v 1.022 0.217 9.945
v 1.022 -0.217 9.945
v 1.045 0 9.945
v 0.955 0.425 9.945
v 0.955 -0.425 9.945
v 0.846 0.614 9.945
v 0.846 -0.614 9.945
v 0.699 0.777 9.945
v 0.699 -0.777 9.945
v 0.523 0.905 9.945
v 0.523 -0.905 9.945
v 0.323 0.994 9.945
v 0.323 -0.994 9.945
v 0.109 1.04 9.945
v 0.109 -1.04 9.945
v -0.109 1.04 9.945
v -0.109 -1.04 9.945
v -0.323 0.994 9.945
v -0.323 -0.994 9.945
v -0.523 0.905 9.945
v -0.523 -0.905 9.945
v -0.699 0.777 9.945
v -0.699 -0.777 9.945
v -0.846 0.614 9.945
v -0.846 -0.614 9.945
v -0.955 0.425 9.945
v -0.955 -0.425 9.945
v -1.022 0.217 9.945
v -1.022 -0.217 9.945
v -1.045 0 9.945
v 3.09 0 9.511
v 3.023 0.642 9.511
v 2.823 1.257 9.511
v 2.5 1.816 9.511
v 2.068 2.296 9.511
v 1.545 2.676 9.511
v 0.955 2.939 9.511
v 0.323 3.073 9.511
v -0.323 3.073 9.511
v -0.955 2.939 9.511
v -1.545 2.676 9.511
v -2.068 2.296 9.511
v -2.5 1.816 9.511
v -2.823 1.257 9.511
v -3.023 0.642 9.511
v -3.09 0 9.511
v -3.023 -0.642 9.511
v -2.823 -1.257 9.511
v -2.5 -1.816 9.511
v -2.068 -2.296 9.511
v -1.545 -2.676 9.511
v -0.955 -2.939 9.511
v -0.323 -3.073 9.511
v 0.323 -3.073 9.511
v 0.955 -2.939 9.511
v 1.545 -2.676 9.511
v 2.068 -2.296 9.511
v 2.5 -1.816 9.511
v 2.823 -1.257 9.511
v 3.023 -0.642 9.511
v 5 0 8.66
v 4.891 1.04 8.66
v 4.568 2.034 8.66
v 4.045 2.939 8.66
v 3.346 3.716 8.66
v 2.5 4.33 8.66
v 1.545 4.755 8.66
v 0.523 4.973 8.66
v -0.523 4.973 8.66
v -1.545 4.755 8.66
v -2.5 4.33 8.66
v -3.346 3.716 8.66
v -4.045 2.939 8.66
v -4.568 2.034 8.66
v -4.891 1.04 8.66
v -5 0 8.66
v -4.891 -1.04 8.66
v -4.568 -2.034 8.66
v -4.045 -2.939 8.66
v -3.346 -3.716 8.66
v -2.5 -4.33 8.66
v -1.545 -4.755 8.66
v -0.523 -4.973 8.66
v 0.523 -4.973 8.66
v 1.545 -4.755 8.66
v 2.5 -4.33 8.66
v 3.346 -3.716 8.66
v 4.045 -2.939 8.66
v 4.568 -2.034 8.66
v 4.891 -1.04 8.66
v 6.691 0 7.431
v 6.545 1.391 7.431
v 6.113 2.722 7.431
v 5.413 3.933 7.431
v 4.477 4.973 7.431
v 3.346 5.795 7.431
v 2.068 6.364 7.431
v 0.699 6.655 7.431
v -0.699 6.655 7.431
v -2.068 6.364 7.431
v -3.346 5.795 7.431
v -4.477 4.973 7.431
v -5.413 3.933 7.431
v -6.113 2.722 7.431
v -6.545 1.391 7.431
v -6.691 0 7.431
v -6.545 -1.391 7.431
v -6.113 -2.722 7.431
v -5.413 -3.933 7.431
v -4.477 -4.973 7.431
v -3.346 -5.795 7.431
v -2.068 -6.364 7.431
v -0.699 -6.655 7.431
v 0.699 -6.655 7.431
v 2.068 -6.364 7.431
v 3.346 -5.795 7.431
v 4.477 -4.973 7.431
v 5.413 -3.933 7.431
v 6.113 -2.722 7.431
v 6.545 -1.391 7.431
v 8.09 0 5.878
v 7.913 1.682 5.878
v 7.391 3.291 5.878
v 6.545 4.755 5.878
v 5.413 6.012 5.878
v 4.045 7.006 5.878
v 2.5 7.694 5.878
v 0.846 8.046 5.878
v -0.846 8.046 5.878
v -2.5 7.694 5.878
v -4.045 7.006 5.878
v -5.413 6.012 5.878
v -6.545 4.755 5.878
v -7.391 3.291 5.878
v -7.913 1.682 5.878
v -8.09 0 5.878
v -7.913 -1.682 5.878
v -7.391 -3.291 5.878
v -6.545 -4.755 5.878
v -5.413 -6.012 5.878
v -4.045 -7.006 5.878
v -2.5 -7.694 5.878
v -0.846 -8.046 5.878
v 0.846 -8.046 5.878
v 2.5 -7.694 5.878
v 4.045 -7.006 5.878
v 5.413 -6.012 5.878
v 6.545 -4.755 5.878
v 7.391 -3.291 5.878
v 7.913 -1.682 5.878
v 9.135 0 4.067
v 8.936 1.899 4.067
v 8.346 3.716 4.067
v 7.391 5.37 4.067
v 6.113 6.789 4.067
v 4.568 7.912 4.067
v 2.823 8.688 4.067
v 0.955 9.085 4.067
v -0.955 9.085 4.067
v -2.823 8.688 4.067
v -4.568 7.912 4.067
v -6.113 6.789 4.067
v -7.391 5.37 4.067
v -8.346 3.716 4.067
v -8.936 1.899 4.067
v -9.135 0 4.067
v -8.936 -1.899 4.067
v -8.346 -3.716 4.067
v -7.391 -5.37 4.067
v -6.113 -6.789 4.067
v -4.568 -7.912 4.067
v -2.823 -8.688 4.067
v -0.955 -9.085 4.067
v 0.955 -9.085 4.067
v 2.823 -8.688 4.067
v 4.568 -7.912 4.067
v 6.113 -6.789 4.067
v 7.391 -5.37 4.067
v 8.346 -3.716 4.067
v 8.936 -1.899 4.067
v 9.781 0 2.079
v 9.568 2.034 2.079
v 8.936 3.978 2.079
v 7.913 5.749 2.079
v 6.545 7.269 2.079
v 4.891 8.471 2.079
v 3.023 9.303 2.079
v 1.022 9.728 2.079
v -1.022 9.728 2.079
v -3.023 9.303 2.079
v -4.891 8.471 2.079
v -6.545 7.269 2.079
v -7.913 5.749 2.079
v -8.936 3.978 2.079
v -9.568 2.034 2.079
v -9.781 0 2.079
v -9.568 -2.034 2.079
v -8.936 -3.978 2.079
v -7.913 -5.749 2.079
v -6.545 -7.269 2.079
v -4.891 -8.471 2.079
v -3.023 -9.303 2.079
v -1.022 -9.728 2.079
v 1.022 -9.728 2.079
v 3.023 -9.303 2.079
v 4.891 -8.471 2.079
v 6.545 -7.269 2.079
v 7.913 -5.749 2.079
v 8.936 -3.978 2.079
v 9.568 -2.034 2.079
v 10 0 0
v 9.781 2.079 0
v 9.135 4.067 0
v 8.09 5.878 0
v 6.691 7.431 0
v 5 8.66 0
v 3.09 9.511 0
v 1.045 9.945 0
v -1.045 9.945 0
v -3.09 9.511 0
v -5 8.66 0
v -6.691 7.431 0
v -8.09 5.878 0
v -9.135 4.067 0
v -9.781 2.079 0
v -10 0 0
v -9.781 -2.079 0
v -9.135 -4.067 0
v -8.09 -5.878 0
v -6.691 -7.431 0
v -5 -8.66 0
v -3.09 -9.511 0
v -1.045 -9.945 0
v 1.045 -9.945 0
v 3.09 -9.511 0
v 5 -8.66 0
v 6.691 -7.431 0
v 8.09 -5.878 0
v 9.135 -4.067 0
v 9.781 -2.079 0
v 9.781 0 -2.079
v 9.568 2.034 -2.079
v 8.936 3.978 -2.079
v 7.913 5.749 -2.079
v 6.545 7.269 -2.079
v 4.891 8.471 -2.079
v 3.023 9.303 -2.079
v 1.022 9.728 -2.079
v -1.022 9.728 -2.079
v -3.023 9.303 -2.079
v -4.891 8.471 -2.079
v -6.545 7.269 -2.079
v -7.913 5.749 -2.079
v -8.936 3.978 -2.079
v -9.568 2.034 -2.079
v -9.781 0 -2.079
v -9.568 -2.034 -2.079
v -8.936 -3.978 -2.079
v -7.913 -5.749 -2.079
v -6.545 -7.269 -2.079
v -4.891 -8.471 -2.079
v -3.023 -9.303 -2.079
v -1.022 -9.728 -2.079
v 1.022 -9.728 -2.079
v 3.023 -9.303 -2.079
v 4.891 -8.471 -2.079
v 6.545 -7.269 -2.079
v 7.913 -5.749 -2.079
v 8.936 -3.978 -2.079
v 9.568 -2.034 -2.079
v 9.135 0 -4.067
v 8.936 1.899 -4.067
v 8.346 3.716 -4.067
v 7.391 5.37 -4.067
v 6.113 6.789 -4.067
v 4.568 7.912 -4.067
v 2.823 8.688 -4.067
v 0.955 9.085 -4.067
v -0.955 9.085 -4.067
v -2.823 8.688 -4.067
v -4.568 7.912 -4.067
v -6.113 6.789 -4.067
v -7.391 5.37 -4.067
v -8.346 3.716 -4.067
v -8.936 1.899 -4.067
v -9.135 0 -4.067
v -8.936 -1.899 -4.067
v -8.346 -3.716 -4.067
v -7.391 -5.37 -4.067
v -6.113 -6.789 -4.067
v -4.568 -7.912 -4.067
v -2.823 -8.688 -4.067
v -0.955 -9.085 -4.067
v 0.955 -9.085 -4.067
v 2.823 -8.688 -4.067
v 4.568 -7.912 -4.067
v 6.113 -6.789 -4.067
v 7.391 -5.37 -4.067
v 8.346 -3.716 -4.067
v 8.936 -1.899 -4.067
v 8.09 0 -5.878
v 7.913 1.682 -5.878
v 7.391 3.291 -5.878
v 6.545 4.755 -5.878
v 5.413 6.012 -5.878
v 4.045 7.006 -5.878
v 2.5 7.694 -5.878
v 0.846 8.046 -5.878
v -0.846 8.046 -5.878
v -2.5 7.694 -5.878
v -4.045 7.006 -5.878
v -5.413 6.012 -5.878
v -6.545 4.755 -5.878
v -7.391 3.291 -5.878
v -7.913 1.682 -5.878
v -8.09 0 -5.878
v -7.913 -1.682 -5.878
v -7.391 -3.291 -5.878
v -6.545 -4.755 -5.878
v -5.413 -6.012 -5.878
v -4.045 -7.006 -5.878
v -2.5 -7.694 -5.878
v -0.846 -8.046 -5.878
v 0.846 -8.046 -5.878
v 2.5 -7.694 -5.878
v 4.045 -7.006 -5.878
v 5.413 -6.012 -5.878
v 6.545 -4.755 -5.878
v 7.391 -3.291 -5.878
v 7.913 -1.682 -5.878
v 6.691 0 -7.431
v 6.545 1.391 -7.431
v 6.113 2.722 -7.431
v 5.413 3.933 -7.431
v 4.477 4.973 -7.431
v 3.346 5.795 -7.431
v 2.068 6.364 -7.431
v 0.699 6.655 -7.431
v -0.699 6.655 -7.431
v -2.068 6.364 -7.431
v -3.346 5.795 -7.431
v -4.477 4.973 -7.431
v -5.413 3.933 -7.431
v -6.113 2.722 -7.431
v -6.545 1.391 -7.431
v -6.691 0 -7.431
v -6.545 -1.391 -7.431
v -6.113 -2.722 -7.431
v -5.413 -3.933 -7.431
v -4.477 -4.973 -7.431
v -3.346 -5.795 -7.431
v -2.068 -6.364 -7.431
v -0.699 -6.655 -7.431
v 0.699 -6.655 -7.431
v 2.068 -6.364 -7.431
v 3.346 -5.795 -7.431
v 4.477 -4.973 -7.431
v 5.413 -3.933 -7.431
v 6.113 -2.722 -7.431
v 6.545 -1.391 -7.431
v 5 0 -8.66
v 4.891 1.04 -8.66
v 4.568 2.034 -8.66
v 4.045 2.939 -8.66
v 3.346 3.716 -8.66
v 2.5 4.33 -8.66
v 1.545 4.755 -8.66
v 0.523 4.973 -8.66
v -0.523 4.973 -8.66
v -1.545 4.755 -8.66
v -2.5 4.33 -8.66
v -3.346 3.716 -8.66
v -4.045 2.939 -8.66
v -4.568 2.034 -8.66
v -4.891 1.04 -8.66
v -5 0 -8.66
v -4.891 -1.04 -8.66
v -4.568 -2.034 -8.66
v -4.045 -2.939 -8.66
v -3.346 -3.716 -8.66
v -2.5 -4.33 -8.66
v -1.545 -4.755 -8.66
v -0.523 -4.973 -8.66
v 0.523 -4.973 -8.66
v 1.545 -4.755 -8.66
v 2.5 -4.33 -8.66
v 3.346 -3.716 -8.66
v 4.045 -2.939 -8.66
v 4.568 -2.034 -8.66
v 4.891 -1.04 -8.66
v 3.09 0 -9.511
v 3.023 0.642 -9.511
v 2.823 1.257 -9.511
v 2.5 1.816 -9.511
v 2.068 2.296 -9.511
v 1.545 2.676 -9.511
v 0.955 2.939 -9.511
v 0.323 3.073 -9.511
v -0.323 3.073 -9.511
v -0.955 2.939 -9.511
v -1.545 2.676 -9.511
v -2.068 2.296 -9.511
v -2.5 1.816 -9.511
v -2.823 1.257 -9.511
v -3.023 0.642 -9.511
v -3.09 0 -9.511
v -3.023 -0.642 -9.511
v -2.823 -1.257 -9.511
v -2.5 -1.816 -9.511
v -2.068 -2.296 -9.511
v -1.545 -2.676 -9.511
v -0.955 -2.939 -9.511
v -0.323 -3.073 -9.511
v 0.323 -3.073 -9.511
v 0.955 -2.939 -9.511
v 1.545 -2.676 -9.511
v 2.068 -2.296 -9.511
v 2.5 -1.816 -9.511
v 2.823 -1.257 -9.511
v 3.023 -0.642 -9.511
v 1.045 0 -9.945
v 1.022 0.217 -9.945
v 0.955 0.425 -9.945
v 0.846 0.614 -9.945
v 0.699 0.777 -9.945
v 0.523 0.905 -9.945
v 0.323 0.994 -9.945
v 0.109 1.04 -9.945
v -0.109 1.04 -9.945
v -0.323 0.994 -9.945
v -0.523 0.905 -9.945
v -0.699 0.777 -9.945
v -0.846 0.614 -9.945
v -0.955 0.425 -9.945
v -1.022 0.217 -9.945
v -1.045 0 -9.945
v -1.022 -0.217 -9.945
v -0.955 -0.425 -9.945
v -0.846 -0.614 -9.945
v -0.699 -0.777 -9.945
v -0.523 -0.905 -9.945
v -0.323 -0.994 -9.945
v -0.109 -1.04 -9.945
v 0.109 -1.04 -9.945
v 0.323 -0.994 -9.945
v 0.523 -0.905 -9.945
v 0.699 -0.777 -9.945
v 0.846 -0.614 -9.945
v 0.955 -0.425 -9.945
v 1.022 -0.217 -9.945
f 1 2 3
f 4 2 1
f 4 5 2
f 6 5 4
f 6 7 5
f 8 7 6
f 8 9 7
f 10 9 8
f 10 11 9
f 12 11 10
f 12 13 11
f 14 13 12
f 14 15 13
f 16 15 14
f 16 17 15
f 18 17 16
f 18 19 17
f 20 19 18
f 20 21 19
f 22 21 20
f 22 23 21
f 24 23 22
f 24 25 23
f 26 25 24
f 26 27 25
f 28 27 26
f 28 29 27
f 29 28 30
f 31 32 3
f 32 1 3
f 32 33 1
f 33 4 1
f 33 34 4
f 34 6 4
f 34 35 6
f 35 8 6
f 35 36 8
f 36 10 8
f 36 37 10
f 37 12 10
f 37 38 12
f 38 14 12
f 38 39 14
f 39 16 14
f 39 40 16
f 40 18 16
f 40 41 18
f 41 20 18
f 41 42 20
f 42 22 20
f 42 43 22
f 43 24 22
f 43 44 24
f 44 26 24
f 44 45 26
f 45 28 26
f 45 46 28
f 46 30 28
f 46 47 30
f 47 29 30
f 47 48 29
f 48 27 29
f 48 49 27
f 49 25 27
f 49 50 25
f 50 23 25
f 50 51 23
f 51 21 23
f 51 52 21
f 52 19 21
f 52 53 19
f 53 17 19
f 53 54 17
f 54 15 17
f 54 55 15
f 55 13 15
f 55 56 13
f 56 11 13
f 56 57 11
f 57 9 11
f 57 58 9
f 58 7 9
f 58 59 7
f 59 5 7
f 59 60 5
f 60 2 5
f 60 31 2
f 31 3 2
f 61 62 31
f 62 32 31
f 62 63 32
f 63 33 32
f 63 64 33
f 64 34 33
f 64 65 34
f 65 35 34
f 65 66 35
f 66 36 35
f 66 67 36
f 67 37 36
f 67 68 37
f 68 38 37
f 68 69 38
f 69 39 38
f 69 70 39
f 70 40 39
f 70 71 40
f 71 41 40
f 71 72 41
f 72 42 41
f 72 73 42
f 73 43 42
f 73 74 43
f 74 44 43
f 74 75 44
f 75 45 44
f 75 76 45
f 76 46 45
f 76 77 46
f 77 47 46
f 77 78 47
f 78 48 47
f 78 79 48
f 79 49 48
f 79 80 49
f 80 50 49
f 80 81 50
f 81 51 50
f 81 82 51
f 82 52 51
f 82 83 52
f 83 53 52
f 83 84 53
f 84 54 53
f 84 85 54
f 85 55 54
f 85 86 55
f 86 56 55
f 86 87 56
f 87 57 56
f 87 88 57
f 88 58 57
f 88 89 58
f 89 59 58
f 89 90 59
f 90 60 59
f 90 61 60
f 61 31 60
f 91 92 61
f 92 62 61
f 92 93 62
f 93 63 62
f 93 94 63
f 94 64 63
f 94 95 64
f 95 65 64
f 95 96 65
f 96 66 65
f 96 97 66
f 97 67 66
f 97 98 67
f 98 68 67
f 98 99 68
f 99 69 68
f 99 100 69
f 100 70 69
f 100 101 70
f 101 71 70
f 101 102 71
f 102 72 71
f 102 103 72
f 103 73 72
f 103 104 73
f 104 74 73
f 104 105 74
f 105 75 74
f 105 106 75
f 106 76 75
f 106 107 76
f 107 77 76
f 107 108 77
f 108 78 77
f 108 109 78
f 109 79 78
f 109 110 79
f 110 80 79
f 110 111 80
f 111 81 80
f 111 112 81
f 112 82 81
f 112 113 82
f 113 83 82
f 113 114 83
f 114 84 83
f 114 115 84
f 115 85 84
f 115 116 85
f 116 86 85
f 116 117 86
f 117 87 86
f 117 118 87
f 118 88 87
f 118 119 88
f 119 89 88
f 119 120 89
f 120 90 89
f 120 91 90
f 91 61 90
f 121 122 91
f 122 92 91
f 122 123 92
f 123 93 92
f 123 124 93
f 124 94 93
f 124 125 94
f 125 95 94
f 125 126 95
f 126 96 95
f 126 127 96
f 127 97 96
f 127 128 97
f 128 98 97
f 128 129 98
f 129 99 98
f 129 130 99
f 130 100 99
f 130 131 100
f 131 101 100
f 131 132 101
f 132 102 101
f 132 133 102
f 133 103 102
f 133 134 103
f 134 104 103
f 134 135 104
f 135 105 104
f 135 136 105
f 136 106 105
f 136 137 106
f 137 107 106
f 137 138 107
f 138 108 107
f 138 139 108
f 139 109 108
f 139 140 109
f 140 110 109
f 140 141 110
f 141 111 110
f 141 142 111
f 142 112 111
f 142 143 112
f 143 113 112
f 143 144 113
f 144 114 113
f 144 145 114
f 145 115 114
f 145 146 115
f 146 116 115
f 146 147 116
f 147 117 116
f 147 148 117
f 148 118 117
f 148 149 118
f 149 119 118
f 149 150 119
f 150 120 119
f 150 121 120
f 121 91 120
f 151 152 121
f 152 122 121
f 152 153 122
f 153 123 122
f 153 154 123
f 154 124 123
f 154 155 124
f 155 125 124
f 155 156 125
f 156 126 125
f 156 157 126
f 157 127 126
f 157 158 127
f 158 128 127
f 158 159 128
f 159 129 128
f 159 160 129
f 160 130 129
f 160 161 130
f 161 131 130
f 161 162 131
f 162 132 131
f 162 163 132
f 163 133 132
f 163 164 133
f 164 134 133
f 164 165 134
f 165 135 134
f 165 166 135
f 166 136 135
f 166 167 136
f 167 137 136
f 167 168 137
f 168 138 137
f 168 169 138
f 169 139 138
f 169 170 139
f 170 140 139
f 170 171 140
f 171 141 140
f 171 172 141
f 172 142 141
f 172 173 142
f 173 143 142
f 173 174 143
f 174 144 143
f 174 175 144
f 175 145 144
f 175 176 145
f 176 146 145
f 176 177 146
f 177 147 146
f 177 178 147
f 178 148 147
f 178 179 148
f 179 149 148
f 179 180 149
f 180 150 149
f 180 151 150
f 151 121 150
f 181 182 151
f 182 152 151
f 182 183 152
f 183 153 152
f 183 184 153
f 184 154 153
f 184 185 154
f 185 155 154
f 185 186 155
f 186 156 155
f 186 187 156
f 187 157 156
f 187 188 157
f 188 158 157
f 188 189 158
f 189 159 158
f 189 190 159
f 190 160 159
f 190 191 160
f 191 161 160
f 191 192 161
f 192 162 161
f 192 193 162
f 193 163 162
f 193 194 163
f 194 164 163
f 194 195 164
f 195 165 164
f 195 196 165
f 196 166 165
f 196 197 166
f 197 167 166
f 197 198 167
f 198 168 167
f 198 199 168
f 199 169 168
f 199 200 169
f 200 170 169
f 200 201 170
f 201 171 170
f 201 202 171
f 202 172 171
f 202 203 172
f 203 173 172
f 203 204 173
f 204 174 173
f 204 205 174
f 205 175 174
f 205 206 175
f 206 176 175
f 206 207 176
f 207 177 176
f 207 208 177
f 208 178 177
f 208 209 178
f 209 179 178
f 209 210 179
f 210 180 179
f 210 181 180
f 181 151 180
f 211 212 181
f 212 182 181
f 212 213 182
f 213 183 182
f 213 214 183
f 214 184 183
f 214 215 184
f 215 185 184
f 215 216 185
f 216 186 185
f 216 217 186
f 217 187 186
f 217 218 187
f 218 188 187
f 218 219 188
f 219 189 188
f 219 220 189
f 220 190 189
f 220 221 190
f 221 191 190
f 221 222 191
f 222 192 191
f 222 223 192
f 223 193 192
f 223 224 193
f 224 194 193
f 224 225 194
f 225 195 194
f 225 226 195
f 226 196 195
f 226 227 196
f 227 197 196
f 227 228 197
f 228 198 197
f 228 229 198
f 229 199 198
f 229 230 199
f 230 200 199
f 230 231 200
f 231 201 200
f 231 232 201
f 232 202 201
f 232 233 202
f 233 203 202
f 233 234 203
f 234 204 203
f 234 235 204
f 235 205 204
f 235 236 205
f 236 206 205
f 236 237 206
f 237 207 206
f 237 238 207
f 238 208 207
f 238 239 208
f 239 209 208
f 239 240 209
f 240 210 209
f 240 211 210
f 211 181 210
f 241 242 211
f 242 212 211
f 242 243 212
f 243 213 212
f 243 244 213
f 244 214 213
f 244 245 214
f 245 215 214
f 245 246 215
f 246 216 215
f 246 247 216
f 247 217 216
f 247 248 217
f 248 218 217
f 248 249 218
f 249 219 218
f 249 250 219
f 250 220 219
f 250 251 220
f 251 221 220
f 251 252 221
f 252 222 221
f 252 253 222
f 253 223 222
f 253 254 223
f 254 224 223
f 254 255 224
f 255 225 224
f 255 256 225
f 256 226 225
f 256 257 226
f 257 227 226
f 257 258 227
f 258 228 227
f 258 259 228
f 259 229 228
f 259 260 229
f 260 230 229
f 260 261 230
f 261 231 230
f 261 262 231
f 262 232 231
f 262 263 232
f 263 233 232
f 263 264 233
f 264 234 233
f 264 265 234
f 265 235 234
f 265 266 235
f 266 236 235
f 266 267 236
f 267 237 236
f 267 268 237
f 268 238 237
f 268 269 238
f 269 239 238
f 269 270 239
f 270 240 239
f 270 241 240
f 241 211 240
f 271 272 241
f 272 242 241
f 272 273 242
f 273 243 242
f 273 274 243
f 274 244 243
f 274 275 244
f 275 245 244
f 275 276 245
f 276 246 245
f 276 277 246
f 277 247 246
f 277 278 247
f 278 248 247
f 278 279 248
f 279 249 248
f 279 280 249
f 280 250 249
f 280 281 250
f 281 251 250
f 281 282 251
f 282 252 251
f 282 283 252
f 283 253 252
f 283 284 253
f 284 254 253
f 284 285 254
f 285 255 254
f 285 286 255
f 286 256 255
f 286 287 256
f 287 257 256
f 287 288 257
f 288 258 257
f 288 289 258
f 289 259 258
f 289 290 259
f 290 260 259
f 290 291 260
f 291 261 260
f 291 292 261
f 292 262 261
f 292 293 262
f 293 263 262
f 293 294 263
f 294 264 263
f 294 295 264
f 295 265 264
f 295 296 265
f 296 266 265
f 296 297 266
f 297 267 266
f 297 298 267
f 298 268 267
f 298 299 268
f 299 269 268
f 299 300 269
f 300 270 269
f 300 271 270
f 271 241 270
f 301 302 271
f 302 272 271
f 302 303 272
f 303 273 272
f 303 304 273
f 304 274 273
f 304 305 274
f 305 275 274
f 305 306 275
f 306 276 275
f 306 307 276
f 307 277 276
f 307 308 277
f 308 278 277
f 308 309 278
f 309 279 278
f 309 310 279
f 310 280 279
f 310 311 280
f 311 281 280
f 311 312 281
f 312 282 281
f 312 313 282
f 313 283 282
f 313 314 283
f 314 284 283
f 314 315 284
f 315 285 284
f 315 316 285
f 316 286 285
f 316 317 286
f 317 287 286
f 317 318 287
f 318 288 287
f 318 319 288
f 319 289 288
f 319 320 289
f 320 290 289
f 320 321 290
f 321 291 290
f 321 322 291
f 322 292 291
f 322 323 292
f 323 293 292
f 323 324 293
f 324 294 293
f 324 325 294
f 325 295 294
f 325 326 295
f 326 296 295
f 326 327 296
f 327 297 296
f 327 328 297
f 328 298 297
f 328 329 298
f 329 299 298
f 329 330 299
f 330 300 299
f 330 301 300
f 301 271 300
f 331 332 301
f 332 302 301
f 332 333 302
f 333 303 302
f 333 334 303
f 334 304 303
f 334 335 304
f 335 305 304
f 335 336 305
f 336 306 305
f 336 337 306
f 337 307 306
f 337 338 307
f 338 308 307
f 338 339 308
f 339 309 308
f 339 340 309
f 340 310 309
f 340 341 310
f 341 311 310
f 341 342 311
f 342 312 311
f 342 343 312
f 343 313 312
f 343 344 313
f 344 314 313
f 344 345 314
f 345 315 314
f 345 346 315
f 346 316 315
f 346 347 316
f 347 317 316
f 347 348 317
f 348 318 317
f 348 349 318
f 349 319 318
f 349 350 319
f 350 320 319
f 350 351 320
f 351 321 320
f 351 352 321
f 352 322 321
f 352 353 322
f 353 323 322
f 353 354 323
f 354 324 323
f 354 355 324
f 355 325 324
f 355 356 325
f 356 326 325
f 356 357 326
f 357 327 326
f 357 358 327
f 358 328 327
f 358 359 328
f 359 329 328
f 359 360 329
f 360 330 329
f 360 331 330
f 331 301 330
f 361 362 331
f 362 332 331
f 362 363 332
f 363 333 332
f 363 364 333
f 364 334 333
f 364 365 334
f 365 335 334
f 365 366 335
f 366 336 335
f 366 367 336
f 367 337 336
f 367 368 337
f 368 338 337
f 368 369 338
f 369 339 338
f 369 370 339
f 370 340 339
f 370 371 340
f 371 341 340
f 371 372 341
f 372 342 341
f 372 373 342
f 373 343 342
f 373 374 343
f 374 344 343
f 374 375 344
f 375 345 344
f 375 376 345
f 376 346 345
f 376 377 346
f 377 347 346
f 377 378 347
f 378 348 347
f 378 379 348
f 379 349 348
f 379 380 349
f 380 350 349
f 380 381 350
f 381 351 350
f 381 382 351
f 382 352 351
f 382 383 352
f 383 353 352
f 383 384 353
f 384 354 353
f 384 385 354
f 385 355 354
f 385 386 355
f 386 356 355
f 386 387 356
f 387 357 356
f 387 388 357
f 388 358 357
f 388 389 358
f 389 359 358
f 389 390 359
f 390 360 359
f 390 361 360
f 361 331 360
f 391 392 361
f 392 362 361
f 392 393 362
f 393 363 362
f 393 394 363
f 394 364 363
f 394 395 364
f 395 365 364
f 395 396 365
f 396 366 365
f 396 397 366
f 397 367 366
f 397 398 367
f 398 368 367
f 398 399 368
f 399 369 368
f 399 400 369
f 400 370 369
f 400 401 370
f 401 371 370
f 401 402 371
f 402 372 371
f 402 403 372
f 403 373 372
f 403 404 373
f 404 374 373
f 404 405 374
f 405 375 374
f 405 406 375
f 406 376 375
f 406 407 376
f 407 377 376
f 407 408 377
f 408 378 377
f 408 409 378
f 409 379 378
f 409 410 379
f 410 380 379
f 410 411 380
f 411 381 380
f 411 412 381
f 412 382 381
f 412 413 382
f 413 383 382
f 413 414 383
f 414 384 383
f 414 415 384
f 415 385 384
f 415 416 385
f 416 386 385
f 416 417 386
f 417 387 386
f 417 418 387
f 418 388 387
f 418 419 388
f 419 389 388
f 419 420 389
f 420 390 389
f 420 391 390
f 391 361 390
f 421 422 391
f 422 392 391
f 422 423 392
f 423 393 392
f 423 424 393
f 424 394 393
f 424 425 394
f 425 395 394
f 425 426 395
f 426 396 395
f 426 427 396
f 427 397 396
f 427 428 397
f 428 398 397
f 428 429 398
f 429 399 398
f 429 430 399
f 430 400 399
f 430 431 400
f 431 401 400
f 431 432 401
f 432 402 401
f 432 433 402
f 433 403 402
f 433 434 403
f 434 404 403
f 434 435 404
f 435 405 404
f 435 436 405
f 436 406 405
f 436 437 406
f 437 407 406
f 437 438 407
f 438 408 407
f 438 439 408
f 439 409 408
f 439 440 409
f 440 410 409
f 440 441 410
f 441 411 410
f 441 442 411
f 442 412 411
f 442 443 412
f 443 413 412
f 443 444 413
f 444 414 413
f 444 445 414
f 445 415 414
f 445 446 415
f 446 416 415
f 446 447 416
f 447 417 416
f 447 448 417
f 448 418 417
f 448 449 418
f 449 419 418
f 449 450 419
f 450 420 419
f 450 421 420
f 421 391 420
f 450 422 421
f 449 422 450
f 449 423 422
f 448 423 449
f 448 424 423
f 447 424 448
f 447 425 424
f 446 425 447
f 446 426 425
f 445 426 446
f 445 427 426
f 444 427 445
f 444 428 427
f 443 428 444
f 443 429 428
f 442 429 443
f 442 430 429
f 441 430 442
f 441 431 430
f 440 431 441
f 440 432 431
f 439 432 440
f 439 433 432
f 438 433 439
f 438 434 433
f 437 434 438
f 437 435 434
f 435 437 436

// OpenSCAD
use <../Util/maths.scad>
use <../Util/text_on.scad>


module construct_cylinder_at_position(vector, distance, h, r) {
  translating_vector = vector * distance  + vector * h / 2;
  start_position_vector = [0, 0, 1]; // starting position of the vector

  q = getQuatWithCrossproductCheck(start_position_vector,vector);
  qmat = quat_to_mat4(q);

  translate(translating_vector)
  multmatrix(qmat) // rotation for connection vector
  cylinder(h=h, r=r, center=true);
}


module construct_text_on_sphere_at_position(vector, r, t, size, spacing) {
    // the starting position for the `text_on_sphere` looks like to be [0, -1, 0]
    // construct_cylinder_at_position([0, -1, 0], 0, 100, 1);

    start_position_vector = [0, -1, 0]; // starting position of the vector
    q = getQuatWithCrossproductCheck(start_position_vector,vector);
    qmat = quat_to_mat4(q);
  
    echo(size, spacing);
  
    multmatrix(qmat) // rotation for connection vector
    text_on_sphere(t=t, r=r, size=size, spacing=spacing);
}


// dev
sphere(10);
construct_text_on_sphere_at_position([1, 1, 111], 10);
